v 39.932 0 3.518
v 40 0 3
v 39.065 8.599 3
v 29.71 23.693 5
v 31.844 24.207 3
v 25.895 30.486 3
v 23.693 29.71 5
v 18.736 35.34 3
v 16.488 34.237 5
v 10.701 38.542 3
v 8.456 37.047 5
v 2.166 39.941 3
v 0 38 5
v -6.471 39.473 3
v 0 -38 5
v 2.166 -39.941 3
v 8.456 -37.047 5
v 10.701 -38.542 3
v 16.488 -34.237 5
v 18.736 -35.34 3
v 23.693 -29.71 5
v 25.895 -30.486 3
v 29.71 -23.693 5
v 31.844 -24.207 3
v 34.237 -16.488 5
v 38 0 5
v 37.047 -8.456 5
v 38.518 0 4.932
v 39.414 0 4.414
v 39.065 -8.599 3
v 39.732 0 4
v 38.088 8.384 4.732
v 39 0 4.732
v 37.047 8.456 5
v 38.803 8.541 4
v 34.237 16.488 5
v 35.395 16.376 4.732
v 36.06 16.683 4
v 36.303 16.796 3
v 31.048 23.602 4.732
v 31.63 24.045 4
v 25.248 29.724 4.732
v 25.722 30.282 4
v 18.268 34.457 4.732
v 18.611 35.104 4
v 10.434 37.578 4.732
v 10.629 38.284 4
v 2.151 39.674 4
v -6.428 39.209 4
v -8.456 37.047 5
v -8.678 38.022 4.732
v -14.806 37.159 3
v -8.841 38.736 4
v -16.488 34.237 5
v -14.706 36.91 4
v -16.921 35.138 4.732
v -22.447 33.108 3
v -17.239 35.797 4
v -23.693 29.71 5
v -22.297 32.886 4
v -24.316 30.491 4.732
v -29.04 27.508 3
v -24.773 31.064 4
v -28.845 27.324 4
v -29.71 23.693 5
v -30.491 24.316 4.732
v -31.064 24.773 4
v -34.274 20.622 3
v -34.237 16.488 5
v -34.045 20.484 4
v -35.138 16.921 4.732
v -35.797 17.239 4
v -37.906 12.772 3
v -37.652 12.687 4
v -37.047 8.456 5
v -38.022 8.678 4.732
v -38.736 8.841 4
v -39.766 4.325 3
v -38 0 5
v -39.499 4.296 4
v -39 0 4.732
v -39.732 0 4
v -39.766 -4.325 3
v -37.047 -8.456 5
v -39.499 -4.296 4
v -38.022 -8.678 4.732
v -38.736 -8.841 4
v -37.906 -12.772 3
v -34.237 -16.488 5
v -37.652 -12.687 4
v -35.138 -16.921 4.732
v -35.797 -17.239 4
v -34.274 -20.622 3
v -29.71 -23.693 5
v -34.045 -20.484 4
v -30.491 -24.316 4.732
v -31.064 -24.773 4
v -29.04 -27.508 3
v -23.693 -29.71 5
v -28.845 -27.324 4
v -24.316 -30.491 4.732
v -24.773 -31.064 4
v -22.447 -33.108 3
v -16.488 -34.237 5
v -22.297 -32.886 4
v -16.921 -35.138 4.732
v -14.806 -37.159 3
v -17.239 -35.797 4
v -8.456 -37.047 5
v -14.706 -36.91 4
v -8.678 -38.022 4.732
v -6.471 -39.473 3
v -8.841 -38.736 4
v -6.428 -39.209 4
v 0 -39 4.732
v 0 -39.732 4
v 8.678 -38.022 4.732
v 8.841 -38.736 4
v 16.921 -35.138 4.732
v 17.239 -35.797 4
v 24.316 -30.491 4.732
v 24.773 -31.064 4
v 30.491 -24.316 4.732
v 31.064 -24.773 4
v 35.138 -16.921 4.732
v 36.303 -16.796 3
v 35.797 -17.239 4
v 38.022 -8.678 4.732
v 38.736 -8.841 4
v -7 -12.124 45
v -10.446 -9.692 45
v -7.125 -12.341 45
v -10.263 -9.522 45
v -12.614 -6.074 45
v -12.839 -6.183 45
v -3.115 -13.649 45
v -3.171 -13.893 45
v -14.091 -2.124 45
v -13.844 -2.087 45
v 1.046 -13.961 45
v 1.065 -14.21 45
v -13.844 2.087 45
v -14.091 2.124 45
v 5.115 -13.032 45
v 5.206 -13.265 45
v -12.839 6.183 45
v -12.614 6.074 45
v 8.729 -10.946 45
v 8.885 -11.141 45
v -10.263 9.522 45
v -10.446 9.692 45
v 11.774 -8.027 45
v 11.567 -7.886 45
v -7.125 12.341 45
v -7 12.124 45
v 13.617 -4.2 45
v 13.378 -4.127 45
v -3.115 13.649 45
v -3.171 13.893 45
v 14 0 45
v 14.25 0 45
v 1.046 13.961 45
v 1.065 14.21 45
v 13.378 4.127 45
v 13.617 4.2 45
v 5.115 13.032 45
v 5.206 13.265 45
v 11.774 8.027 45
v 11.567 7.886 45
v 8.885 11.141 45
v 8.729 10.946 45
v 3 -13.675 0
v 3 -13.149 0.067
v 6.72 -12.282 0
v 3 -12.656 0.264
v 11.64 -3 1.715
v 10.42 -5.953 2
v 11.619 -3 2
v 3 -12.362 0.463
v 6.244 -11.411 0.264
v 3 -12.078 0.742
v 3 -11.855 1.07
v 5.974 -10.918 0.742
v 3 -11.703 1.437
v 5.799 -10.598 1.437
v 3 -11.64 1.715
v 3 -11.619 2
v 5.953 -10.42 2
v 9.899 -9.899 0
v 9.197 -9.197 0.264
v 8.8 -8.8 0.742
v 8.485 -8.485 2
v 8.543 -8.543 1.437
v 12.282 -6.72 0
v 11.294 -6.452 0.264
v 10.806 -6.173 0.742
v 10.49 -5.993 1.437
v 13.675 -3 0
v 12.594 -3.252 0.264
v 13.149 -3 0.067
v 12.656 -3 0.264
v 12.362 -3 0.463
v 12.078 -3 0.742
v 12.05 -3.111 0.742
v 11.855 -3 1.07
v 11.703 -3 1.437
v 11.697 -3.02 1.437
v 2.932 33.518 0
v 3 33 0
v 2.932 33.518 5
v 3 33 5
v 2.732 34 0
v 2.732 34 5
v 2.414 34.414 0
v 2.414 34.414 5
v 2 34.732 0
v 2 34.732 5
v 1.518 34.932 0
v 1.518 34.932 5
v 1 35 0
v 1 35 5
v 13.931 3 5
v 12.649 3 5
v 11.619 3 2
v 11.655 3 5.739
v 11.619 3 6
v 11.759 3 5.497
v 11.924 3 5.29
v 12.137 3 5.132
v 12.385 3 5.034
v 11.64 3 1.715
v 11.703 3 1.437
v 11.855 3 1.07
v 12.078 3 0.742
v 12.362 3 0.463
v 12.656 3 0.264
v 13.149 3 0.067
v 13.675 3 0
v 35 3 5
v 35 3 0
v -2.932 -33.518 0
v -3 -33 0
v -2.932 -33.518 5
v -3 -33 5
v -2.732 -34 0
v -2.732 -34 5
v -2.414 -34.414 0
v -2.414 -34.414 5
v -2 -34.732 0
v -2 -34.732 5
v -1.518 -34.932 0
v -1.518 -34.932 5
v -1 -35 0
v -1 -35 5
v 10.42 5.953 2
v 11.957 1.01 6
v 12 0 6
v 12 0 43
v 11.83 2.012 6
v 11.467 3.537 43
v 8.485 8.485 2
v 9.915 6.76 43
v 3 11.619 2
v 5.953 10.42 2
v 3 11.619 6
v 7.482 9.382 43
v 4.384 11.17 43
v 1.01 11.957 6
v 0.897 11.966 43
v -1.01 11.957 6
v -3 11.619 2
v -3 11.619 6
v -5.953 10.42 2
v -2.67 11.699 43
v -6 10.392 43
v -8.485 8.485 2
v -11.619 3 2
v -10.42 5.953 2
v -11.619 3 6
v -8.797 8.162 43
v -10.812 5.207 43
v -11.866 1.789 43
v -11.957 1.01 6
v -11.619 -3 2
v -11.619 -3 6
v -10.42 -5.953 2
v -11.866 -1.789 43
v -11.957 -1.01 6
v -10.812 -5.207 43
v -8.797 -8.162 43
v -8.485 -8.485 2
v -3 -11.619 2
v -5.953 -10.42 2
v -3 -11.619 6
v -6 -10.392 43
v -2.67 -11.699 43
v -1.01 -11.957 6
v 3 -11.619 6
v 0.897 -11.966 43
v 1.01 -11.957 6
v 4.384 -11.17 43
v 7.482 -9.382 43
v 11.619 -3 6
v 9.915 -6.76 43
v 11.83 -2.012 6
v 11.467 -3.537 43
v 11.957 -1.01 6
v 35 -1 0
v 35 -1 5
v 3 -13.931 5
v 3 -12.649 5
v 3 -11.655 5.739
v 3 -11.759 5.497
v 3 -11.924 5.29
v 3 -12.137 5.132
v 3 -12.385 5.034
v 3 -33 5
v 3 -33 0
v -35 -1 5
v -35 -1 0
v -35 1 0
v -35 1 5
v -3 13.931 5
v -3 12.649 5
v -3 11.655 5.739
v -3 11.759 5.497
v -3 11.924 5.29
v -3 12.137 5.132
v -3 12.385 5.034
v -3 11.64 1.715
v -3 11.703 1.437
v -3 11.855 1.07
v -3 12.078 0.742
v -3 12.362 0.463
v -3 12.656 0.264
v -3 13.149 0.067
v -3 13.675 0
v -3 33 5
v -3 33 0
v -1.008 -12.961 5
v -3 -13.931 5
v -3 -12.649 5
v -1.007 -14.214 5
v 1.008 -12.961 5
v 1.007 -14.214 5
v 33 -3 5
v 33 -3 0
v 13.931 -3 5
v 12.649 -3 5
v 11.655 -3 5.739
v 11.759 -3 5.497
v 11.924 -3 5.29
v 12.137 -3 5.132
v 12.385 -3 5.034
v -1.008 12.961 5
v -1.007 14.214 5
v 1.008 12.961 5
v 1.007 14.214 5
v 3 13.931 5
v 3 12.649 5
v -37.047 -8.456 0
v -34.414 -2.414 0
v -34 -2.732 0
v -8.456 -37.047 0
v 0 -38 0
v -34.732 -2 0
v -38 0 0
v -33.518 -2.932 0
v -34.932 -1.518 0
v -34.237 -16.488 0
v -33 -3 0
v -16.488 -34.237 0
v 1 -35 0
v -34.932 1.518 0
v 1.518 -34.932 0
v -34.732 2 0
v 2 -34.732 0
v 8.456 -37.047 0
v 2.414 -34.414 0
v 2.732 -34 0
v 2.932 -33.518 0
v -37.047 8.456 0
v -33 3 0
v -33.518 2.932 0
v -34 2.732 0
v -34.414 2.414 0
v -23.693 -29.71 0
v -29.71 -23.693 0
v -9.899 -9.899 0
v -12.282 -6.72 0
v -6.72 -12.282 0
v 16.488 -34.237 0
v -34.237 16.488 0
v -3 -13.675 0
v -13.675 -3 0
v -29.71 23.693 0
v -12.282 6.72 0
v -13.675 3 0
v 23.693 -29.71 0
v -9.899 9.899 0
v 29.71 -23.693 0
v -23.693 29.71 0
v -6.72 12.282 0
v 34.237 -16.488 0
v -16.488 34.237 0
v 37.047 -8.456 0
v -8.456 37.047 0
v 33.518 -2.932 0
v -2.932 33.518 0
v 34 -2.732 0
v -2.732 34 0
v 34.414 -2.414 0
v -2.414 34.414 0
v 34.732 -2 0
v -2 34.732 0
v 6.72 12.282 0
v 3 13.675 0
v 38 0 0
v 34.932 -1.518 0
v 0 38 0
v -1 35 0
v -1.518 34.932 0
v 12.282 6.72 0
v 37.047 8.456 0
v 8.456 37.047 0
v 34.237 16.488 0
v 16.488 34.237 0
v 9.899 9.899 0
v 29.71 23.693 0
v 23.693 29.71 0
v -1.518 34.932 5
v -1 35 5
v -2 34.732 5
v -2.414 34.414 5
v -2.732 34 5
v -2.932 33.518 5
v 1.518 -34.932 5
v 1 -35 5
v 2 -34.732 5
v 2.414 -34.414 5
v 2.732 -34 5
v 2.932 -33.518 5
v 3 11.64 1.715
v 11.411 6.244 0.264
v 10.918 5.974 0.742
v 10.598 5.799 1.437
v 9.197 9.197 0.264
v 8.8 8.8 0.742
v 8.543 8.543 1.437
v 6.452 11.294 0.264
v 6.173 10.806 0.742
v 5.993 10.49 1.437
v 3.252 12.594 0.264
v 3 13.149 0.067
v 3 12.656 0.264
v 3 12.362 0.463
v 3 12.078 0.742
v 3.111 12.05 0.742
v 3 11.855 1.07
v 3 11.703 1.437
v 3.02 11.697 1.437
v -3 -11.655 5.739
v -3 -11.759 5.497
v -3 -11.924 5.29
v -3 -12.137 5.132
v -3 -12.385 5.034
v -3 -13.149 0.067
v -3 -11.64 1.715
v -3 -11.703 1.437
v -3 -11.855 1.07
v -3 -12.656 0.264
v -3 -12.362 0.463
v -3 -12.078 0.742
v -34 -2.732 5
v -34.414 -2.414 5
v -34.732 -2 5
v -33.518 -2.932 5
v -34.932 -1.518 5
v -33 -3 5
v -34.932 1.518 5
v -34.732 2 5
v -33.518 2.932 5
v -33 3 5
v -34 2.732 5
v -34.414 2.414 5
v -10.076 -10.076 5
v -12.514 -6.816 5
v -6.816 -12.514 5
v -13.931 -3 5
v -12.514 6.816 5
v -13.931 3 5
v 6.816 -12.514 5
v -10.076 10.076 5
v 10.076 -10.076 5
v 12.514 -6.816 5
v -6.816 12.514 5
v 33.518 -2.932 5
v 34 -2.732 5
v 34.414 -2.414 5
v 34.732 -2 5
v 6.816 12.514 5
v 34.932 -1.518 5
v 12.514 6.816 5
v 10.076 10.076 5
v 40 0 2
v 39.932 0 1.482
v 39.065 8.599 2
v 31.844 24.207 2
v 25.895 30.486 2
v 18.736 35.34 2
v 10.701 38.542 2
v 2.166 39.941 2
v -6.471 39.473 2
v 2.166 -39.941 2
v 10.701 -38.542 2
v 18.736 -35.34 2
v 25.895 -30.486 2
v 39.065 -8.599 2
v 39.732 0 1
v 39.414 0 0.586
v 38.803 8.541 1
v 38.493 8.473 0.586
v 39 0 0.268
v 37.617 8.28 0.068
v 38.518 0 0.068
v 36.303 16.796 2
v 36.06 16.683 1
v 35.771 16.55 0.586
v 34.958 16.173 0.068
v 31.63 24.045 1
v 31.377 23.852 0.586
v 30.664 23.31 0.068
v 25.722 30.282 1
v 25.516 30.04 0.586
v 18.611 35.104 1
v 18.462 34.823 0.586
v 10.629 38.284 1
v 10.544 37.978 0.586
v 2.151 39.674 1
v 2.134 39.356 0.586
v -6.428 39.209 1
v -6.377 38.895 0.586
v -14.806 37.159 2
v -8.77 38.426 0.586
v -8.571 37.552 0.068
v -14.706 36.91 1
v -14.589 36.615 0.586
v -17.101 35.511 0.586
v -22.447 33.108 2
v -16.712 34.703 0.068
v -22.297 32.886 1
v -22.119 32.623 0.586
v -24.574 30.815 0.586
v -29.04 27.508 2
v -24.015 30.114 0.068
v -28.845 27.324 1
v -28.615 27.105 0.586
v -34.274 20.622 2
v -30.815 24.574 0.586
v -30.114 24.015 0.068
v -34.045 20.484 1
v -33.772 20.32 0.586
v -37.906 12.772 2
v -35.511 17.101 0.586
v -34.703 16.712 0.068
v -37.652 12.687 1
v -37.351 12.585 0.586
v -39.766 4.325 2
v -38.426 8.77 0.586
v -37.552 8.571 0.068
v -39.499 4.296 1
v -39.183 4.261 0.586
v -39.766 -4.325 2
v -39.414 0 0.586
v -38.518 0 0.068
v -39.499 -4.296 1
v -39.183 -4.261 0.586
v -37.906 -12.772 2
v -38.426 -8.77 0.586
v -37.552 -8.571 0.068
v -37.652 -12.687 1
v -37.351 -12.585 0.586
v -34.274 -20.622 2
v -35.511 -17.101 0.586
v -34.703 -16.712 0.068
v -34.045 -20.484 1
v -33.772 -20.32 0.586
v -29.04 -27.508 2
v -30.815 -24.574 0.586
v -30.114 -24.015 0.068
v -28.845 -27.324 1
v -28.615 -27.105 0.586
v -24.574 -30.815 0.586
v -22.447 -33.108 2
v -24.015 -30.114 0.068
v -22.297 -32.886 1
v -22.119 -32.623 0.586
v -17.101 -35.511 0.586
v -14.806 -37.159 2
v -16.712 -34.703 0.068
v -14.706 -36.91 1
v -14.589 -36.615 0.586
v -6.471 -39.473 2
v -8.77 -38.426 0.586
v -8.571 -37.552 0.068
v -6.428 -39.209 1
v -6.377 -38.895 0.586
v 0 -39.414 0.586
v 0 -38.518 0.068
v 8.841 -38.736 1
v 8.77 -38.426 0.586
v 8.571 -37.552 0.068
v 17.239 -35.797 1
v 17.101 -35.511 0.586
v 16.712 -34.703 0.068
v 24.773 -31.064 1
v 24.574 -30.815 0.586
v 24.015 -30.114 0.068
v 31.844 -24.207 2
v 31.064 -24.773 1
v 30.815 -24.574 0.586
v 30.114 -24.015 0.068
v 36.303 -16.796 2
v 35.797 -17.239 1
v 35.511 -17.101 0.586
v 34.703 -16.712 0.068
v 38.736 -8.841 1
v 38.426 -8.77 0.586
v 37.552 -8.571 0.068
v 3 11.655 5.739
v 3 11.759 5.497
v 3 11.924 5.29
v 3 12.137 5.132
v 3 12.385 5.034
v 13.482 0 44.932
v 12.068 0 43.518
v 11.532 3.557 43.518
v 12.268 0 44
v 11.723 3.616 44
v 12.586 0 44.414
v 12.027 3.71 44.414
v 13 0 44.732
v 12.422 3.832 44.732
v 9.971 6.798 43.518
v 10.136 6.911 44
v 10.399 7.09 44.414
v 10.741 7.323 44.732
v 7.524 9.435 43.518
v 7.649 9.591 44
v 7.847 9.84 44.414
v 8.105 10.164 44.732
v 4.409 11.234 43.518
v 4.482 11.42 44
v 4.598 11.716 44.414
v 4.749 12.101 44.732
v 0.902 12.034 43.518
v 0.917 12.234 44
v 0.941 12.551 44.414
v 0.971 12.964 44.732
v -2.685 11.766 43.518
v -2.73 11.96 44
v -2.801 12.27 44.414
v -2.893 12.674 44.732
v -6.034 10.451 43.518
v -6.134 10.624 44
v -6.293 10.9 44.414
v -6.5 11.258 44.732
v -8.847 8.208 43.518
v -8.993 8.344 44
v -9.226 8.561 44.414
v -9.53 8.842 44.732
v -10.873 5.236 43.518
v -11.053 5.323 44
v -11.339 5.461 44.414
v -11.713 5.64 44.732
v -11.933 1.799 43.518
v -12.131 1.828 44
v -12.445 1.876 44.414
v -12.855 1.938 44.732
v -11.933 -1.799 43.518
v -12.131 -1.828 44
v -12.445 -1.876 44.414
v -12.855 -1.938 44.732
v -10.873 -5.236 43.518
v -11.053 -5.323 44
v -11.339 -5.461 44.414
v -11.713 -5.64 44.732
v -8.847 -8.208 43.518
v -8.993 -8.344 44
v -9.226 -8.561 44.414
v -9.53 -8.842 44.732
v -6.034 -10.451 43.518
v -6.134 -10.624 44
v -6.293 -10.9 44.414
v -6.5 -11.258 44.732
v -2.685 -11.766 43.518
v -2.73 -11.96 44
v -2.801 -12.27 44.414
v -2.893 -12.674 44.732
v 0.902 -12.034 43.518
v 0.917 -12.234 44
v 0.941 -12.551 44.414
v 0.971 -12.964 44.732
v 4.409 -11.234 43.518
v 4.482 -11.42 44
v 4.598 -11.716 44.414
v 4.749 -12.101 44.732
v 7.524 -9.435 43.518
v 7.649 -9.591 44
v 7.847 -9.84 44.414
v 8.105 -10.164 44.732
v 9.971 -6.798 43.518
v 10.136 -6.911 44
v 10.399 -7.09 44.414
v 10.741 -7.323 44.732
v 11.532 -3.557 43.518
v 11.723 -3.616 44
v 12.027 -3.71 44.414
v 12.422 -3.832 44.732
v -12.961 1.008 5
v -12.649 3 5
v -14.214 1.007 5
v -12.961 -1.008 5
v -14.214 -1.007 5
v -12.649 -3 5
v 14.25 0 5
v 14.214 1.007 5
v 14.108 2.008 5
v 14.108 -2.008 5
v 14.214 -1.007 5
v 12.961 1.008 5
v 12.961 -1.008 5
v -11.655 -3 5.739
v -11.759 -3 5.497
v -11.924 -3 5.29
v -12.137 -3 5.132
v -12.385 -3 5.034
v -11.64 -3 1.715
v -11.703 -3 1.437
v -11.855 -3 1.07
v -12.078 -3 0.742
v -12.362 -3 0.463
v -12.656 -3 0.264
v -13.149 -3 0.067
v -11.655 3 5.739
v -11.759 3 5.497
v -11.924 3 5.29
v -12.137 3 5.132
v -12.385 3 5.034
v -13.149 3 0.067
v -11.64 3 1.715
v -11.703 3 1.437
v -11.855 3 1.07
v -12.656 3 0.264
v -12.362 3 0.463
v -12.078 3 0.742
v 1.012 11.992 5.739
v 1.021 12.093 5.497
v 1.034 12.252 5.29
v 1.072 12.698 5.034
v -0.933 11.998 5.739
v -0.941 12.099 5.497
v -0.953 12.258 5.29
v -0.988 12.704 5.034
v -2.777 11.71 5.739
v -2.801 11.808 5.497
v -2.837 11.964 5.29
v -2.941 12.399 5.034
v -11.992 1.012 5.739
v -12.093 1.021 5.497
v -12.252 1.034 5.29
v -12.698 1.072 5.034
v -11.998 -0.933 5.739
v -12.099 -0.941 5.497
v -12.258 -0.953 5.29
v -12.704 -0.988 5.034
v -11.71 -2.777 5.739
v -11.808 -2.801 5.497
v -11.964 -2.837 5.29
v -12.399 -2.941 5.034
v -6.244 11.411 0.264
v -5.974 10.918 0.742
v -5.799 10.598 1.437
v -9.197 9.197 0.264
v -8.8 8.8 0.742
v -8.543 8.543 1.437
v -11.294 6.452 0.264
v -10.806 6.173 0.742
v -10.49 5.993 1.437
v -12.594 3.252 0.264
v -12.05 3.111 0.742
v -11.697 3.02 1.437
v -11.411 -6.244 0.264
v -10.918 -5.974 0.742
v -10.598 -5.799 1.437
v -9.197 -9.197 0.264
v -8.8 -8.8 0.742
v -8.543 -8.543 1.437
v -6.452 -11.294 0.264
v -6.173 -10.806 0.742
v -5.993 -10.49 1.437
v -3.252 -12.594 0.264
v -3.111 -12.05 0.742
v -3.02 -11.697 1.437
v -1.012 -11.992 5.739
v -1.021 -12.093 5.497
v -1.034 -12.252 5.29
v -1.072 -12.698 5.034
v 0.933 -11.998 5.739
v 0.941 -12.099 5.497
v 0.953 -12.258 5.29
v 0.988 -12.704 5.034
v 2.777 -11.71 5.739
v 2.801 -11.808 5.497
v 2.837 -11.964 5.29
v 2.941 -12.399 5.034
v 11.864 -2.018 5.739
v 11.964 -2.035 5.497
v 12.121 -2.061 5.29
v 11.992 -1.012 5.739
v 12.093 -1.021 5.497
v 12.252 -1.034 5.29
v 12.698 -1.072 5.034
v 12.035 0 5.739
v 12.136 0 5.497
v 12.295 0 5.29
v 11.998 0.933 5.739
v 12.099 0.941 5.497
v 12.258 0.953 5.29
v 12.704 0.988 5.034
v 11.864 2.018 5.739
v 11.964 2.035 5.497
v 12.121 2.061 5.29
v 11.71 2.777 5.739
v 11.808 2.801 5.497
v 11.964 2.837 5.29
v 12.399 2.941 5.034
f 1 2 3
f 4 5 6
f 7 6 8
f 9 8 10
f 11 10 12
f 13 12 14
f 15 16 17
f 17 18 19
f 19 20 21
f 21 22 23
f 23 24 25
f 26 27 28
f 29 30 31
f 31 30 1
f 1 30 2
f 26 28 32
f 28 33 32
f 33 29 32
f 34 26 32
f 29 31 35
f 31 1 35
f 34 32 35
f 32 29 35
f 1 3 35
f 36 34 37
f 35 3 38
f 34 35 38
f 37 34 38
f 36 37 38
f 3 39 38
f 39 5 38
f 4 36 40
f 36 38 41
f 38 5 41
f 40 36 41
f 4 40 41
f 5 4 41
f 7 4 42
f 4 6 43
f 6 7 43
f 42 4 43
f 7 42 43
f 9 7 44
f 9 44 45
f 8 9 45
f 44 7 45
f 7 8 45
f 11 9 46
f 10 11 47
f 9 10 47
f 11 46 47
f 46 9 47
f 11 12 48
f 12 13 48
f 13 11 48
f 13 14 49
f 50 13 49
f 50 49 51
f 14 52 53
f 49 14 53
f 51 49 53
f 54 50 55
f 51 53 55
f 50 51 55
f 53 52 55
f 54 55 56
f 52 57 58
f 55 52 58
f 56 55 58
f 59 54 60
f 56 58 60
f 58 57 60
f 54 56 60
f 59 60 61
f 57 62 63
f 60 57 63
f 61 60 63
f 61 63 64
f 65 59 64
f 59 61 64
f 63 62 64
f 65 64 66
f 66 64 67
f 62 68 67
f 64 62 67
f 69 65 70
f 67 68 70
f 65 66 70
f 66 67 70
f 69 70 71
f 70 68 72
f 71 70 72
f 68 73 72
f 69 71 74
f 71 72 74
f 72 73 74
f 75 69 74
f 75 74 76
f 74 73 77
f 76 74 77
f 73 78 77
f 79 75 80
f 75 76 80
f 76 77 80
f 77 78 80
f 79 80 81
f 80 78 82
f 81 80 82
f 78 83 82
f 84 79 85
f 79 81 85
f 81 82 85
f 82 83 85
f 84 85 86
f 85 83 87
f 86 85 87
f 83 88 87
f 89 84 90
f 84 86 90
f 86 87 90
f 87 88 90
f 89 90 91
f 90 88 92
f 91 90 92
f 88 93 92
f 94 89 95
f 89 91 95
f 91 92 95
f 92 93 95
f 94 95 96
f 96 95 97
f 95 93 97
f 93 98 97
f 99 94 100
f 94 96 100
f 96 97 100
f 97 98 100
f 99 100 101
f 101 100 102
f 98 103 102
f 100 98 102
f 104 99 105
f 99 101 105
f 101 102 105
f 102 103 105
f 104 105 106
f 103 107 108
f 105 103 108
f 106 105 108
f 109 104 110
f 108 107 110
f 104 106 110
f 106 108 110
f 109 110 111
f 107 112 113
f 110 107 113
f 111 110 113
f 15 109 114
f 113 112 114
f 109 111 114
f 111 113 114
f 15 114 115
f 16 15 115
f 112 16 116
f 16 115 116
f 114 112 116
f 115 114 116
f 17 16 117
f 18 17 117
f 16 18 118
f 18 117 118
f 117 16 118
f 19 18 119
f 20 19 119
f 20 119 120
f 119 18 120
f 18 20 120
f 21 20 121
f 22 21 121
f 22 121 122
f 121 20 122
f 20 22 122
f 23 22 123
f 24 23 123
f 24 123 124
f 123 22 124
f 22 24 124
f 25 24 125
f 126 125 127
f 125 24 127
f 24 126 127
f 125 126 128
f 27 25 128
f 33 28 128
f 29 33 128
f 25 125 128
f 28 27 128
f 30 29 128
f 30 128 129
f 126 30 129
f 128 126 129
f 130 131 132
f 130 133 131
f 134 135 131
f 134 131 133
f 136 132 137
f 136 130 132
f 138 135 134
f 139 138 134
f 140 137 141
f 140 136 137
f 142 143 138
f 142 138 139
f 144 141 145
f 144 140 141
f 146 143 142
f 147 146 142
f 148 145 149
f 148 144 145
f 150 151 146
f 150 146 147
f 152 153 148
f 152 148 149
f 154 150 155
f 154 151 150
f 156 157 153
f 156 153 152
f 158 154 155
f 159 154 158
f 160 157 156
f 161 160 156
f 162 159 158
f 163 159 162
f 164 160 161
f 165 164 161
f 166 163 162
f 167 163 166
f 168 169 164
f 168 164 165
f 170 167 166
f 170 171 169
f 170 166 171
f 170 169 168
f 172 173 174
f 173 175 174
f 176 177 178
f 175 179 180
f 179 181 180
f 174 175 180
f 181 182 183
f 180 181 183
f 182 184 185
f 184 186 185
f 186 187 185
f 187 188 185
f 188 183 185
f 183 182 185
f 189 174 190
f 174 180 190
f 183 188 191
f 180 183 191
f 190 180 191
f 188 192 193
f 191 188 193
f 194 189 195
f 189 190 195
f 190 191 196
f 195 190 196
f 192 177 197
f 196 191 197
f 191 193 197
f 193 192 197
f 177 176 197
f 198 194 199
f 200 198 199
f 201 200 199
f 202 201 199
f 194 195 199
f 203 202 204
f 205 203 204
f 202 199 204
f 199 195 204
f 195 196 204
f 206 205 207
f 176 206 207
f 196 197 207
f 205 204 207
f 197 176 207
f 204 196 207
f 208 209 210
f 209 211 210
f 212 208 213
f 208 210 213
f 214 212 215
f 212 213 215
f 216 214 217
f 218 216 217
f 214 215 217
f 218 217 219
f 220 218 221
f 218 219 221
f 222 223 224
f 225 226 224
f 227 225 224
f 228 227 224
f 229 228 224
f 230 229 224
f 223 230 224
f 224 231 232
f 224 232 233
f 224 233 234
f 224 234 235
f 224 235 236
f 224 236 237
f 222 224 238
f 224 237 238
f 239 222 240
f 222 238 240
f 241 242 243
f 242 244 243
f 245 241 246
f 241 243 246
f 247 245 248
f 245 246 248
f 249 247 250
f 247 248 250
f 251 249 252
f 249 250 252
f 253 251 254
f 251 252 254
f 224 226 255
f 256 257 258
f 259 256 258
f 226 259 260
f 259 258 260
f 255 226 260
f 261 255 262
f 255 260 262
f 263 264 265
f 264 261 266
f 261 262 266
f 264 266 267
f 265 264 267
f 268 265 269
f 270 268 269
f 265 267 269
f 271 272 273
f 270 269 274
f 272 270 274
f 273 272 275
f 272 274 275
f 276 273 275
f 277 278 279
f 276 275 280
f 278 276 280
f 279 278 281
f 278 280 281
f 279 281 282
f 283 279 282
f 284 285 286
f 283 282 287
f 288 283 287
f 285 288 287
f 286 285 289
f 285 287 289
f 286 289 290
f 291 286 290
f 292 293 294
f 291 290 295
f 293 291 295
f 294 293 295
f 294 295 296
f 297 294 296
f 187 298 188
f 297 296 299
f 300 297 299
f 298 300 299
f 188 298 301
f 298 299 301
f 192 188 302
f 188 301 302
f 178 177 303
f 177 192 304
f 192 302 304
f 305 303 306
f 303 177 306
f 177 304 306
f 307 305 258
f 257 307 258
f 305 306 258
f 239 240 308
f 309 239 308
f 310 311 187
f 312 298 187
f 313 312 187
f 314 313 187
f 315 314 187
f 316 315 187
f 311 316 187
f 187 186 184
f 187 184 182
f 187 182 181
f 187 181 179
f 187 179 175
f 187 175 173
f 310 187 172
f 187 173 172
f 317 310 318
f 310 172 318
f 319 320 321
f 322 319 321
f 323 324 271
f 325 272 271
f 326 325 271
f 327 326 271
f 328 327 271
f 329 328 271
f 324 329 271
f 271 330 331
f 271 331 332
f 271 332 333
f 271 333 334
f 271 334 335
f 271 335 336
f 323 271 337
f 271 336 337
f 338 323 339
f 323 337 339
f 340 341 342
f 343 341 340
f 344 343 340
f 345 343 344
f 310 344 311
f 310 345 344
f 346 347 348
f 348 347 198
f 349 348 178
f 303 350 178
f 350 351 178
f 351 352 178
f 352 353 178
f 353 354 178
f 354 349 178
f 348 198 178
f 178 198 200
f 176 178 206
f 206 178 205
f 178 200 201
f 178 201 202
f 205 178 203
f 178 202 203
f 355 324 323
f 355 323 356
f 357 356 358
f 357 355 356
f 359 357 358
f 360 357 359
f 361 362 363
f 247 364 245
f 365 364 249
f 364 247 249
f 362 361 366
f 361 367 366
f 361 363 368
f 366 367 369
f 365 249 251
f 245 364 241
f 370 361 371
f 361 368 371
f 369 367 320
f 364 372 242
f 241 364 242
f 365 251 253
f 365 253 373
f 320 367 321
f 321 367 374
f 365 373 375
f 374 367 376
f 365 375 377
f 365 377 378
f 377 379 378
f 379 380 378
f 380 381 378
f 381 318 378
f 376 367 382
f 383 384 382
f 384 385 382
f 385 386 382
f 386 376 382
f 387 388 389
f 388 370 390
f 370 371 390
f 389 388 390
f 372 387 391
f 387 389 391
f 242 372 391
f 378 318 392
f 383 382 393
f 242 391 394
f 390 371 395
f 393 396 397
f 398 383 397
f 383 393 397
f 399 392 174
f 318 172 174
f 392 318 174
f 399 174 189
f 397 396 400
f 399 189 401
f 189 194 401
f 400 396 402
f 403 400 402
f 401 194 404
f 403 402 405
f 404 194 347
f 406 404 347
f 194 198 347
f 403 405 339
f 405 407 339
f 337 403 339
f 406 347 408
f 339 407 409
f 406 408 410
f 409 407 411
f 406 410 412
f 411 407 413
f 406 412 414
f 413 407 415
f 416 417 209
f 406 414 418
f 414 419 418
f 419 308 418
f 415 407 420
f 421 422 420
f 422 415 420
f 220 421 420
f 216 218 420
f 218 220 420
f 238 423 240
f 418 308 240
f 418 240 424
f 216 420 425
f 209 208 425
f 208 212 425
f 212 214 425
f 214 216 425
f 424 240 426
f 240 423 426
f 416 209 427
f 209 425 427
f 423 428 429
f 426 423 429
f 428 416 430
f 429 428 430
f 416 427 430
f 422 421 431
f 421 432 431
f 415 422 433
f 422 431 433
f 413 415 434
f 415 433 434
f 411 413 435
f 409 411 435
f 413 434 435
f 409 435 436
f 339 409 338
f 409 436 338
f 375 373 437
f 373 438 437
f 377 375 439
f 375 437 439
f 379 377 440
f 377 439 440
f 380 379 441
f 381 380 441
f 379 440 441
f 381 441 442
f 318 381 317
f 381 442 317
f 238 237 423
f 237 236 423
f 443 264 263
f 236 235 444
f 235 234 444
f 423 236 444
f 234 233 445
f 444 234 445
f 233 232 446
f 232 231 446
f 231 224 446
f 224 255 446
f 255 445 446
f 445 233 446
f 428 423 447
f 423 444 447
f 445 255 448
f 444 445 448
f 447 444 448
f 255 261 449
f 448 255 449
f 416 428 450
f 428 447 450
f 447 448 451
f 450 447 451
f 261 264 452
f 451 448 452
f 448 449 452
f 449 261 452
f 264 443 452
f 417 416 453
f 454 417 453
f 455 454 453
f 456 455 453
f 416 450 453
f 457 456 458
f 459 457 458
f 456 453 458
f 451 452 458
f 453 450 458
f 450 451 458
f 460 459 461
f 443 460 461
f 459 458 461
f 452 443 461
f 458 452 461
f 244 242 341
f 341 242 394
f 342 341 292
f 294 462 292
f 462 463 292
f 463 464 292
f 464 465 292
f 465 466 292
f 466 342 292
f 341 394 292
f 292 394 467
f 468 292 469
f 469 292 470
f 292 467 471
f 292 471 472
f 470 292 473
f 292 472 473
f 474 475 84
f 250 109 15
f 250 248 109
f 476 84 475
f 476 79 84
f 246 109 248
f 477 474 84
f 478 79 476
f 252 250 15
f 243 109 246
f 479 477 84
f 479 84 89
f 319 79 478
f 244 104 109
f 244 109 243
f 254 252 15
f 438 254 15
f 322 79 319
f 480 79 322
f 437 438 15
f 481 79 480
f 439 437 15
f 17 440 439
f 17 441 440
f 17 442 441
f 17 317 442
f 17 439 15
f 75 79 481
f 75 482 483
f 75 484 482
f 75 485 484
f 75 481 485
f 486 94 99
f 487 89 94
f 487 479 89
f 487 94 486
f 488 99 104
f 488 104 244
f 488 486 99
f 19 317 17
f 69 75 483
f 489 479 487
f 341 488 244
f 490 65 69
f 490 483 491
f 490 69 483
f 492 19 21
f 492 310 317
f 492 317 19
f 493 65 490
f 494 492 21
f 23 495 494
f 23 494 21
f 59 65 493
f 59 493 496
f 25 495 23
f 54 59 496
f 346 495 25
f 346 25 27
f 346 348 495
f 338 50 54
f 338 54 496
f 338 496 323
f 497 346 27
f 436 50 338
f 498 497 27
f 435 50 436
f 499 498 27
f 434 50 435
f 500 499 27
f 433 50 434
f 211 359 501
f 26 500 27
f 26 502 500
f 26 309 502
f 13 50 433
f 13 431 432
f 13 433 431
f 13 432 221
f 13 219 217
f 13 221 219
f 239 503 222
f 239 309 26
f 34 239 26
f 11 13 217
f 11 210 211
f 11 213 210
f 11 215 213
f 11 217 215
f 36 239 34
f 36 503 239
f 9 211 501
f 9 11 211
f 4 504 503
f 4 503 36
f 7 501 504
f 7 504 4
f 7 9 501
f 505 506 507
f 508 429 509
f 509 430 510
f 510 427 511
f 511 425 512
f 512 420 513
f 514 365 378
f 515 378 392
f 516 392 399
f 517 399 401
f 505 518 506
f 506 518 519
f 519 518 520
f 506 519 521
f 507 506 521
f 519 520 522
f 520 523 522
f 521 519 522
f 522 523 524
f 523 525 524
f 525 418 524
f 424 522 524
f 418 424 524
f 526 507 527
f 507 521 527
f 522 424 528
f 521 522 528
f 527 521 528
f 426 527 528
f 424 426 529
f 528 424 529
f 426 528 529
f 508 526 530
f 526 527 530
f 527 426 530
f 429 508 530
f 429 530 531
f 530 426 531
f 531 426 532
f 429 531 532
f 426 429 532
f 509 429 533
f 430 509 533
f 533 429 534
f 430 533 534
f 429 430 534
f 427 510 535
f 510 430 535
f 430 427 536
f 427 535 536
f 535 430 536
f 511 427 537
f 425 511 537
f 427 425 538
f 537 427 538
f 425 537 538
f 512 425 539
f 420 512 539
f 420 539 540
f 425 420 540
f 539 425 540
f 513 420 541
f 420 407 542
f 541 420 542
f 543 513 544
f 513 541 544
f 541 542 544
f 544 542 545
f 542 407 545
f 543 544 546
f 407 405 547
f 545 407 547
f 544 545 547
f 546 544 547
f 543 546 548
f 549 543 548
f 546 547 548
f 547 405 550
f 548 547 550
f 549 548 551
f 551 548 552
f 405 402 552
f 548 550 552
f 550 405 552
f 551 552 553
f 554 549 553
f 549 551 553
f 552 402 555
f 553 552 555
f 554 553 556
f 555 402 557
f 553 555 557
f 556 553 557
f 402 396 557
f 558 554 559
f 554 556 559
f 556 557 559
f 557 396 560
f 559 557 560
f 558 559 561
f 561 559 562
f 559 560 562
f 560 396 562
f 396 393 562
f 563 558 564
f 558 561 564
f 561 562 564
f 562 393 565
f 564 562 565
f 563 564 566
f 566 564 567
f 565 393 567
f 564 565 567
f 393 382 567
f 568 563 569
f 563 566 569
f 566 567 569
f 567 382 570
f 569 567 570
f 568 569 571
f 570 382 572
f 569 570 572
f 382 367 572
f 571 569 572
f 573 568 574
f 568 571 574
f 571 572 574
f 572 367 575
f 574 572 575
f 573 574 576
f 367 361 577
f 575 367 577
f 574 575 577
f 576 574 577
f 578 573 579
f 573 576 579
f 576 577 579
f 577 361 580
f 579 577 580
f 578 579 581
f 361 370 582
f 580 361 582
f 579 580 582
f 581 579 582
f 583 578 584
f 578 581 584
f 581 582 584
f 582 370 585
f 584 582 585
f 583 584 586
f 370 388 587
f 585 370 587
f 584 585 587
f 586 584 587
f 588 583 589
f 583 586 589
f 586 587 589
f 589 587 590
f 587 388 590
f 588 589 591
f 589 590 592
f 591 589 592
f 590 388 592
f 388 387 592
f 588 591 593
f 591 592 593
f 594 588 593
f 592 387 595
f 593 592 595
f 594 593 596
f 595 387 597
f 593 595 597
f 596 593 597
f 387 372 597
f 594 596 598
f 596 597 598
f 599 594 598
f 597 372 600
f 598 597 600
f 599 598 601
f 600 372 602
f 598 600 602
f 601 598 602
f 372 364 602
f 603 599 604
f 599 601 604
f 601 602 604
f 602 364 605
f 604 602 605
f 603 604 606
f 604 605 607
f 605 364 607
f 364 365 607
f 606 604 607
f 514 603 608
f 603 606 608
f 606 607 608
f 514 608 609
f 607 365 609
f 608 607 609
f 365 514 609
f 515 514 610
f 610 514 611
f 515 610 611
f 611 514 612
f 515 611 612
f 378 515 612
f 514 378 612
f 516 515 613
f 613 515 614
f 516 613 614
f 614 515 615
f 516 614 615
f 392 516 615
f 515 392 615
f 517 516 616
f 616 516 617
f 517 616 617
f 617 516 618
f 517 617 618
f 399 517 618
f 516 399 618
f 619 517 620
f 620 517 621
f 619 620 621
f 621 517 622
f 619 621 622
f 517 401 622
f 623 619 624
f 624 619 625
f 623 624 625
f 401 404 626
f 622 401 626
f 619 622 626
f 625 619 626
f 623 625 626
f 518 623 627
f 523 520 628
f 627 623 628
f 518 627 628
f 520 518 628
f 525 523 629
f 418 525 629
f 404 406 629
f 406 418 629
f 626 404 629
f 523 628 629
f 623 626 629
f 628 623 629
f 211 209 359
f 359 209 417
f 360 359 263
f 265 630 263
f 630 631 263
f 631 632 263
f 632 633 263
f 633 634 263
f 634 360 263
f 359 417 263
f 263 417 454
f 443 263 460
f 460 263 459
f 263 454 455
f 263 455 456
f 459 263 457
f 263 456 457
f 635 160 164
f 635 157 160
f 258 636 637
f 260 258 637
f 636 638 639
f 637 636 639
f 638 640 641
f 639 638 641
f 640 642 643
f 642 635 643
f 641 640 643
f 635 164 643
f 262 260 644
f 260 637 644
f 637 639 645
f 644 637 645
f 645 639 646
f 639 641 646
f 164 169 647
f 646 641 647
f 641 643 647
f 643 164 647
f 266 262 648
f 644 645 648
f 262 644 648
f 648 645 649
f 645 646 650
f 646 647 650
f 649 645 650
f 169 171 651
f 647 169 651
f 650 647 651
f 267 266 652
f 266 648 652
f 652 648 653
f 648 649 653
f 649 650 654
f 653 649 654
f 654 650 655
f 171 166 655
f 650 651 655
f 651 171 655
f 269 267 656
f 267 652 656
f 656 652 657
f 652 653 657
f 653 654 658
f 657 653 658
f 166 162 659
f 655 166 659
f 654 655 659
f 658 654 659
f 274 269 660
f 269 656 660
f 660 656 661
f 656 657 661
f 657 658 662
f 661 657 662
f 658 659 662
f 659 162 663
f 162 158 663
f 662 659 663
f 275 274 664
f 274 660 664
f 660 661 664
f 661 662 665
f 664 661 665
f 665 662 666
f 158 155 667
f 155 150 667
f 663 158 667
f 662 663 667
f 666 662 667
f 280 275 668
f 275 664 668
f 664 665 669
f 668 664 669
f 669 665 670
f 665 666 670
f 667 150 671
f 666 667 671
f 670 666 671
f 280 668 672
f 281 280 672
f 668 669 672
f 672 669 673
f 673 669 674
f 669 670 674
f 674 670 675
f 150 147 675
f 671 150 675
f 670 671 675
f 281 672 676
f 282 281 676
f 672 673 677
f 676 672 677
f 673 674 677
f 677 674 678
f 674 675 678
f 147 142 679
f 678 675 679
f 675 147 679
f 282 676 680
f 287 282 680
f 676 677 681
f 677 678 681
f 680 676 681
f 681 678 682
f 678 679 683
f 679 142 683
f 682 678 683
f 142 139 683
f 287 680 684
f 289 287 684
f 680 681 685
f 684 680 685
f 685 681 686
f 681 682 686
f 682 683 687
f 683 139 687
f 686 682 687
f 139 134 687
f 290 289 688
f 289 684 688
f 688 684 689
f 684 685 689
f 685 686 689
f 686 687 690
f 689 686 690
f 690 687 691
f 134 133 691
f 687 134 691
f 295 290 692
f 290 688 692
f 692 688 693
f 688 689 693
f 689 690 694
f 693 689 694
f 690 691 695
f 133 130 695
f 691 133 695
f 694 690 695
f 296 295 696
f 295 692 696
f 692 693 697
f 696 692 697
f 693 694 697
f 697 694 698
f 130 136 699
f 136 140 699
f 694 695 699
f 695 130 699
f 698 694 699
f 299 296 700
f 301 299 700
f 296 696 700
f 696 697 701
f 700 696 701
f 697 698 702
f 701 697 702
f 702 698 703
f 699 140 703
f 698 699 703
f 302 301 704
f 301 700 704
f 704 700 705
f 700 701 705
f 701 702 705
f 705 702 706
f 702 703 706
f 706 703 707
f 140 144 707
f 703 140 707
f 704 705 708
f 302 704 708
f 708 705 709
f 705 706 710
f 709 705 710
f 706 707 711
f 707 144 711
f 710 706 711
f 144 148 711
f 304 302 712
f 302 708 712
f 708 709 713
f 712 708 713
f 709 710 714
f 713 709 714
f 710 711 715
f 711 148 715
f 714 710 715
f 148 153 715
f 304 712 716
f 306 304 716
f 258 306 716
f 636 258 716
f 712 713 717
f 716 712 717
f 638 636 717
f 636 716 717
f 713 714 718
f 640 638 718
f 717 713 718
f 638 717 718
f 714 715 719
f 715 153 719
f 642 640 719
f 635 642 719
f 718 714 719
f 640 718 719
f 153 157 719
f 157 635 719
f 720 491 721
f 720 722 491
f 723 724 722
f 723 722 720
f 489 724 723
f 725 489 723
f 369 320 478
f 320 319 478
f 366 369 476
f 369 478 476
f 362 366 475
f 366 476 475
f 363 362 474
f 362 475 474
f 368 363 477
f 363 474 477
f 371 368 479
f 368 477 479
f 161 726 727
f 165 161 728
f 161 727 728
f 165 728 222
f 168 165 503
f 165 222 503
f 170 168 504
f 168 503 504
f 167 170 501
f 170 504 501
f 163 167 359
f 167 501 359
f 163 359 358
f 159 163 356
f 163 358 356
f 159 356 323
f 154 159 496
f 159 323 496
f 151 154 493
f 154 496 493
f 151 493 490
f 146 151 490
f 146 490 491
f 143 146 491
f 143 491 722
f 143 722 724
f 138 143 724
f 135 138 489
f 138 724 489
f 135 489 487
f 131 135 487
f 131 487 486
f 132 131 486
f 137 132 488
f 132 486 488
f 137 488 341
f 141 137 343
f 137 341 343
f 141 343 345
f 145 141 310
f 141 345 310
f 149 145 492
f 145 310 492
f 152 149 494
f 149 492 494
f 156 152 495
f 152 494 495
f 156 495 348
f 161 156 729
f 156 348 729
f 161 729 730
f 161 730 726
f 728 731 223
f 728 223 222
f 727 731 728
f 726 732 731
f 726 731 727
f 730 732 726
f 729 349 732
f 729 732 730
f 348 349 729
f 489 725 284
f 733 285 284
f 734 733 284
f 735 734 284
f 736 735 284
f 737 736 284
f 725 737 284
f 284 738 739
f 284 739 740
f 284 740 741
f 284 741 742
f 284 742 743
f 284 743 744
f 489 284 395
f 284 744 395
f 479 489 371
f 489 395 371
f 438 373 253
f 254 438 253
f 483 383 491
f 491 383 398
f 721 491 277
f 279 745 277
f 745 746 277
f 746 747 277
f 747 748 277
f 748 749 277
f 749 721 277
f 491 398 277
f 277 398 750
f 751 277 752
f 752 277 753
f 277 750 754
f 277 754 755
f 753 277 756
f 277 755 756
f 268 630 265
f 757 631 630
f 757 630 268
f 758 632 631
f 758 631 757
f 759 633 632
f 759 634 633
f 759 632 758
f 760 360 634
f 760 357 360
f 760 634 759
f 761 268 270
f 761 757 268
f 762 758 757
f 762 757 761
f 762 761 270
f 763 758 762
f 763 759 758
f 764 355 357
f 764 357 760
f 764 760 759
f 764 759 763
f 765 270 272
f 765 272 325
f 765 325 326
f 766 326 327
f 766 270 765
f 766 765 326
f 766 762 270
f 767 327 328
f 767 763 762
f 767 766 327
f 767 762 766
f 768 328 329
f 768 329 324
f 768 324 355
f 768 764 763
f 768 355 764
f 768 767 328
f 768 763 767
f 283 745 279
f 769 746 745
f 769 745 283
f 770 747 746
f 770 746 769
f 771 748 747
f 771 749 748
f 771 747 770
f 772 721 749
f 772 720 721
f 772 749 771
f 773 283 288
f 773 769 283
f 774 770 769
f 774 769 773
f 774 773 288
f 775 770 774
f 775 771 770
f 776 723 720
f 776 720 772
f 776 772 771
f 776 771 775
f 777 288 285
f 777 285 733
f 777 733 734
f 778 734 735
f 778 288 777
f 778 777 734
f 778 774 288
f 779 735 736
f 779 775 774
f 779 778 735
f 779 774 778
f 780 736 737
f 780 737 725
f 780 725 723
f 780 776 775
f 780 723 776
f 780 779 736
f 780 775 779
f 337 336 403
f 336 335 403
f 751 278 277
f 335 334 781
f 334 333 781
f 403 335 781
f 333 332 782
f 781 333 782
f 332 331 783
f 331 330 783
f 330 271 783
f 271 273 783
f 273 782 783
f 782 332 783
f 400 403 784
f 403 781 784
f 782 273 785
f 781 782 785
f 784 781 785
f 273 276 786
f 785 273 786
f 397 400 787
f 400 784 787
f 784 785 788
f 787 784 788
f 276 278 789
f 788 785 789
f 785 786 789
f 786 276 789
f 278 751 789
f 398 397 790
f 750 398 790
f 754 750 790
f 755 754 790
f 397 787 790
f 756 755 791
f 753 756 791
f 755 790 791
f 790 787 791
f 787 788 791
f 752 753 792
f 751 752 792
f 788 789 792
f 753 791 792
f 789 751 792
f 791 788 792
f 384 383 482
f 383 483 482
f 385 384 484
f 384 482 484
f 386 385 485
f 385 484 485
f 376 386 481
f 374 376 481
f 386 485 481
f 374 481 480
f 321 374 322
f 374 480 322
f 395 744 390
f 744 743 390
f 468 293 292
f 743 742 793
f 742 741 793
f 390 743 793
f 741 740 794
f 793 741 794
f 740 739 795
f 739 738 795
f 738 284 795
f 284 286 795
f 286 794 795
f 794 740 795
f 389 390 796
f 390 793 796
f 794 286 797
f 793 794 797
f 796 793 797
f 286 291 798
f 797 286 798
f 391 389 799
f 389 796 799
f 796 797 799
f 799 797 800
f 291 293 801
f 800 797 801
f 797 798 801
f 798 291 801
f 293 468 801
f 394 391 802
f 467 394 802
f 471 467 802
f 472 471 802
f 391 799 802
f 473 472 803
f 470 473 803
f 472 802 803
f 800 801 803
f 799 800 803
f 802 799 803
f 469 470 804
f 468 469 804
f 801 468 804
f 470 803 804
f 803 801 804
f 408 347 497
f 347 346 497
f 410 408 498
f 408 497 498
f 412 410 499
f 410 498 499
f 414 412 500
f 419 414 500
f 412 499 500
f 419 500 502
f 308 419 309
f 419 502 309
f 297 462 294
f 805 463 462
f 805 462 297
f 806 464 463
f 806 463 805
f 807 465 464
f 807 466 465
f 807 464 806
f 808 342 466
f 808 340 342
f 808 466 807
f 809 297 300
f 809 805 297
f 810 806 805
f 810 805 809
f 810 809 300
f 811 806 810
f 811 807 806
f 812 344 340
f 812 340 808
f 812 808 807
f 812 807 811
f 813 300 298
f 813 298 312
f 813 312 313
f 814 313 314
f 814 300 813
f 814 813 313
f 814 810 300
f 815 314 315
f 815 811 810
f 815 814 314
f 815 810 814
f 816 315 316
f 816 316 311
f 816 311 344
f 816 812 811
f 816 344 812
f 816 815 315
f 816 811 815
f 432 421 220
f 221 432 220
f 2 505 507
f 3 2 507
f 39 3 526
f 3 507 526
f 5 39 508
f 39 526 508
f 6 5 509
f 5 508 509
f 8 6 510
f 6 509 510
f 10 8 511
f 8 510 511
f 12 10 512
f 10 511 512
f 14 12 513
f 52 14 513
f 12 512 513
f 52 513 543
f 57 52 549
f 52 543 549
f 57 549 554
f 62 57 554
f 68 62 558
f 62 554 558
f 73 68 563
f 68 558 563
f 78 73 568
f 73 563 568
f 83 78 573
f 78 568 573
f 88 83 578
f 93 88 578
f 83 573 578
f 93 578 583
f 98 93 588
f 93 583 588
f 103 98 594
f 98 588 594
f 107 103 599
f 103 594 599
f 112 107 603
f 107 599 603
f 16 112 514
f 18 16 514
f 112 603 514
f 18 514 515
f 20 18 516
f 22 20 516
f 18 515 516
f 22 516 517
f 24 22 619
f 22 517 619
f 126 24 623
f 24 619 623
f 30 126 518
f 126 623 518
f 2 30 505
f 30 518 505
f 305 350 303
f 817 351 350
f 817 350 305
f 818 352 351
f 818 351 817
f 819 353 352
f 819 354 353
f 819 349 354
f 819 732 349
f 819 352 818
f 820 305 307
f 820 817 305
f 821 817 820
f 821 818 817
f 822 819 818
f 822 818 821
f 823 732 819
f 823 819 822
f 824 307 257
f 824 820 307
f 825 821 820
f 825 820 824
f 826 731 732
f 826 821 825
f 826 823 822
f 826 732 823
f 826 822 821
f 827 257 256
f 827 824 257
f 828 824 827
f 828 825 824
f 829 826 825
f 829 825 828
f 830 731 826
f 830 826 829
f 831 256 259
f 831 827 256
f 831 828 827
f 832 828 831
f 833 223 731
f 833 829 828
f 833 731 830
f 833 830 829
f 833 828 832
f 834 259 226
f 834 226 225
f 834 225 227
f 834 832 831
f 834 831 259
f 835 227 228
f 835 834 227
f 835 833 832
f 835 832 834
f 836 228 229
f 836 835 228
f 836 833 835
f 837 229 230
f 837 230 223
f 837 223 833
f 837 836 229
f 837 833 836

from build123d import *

# Parameters (mm, degrees)
SKETCH_R        = 40
PAD_DEPTH       = 5
SKETCH001_R     = 14.25
PAD001_DEPTH    = 40
SKETCH002_R     = 12
POCKET_DEPTH    = 45.001
POCKET001_DEPTH = 5
FILLET_R        = 2
FILLET001_R     = 2
FILLET002_R     = 1
FILLET003_R     = 2
FILLET004_R     = 2


with BuildPart() as part:
    # Sketch → Pad (new body)
    with BuildSketch(Plane.XY):
        Circle(SKETCH_R)
    extrude(amount=PAD_DEPTH)

    # Sketch001 (on Face3 of Pad) → Pad001 (join)
    with BuildSketch(Plane.XY.offset(5)):
        Circle(SKETCH001_R)
    extrude(amount=PAD001_DEPTH)

    # Sketch002 (on Face5 of Pad001) → Pocket (cut, through all)
    with BuildSketch(Plane.XY.offset(45)):
        Circle(SKETCH002_R)
    extrude(amount=-POCKET_DEPTH, mode=Mode.SUBTRACT)

    # Sketch003 (on Face2 of Pocket) → Pocket001 (cut)
    with BuildSketch(Plane(origin=(0, 0, 0), x_dir=(1, 0, 0), z_dir=(0, 0, -1))):
        Polygon((-3, 35), (-3, 3), (-35, 3), (-35, -3), (-3, -3), (-3, -35), (3, -35), (3, -3), (35, -3), (35, 3), (3, 3), (3, 35), align=None)
    extrude(amount=-POCKET001_DEPTH, mode=Mode.SUBTRACT)

    # Fillet
    fillet_edges = [part.edges().sort_by_distance(p)[0] for p in [
        (-3, -35, 2.5),
        (3, -35, 2.5),
        (35, -3, 2.5),
        (-35, -3, 2.5),
        (-35, 3, 2.5),
        (-3, 35, 2.5),
        (3, 35, 2.5),
    ]]
    fillet(fillet_edges, radius=FILLET_R)

    # Fillet001
    fillet001_edges = [part.edges().sort_by_distance(p)[0] for p in [
        (8.485281, -8.485281, 0),
        (8.485281, 8.485281, 0),
        (-8.485281, 8.485281, 0),
        (-8.485281, -8.485281, 0),
    ]]
    fillet(fillet001_edges, radius=FILLET001_R)

    # Fillet002
    fillet002_edges = [part.edges().sort_by_distance(p)[0] for p in [
        (0, -12, 5),
        (11.904356, -1.512052, 5),
        (0, 12, 5),
        (-12, 0, 5),
    ]]
    fillet(fillet002_edges, radius=FILLET002_R)

    # Fillet003
    fillet003_edges = [part.edges().sort_by_distance(p)[0] for p in [
        (-40, 0, 5),
        (-40, 0, 0),
    ]]
    fillet(fillet003_edges, radius=FILLET003_R)

    # Fillet004
    fillet004_edges = [part.edges().sort_by_distance(p)[0] for p in [
        (-12, 0, 45),
    ]]
    fillet(fillet004_edges, radius=FILLET004_R)


solid = part.part
